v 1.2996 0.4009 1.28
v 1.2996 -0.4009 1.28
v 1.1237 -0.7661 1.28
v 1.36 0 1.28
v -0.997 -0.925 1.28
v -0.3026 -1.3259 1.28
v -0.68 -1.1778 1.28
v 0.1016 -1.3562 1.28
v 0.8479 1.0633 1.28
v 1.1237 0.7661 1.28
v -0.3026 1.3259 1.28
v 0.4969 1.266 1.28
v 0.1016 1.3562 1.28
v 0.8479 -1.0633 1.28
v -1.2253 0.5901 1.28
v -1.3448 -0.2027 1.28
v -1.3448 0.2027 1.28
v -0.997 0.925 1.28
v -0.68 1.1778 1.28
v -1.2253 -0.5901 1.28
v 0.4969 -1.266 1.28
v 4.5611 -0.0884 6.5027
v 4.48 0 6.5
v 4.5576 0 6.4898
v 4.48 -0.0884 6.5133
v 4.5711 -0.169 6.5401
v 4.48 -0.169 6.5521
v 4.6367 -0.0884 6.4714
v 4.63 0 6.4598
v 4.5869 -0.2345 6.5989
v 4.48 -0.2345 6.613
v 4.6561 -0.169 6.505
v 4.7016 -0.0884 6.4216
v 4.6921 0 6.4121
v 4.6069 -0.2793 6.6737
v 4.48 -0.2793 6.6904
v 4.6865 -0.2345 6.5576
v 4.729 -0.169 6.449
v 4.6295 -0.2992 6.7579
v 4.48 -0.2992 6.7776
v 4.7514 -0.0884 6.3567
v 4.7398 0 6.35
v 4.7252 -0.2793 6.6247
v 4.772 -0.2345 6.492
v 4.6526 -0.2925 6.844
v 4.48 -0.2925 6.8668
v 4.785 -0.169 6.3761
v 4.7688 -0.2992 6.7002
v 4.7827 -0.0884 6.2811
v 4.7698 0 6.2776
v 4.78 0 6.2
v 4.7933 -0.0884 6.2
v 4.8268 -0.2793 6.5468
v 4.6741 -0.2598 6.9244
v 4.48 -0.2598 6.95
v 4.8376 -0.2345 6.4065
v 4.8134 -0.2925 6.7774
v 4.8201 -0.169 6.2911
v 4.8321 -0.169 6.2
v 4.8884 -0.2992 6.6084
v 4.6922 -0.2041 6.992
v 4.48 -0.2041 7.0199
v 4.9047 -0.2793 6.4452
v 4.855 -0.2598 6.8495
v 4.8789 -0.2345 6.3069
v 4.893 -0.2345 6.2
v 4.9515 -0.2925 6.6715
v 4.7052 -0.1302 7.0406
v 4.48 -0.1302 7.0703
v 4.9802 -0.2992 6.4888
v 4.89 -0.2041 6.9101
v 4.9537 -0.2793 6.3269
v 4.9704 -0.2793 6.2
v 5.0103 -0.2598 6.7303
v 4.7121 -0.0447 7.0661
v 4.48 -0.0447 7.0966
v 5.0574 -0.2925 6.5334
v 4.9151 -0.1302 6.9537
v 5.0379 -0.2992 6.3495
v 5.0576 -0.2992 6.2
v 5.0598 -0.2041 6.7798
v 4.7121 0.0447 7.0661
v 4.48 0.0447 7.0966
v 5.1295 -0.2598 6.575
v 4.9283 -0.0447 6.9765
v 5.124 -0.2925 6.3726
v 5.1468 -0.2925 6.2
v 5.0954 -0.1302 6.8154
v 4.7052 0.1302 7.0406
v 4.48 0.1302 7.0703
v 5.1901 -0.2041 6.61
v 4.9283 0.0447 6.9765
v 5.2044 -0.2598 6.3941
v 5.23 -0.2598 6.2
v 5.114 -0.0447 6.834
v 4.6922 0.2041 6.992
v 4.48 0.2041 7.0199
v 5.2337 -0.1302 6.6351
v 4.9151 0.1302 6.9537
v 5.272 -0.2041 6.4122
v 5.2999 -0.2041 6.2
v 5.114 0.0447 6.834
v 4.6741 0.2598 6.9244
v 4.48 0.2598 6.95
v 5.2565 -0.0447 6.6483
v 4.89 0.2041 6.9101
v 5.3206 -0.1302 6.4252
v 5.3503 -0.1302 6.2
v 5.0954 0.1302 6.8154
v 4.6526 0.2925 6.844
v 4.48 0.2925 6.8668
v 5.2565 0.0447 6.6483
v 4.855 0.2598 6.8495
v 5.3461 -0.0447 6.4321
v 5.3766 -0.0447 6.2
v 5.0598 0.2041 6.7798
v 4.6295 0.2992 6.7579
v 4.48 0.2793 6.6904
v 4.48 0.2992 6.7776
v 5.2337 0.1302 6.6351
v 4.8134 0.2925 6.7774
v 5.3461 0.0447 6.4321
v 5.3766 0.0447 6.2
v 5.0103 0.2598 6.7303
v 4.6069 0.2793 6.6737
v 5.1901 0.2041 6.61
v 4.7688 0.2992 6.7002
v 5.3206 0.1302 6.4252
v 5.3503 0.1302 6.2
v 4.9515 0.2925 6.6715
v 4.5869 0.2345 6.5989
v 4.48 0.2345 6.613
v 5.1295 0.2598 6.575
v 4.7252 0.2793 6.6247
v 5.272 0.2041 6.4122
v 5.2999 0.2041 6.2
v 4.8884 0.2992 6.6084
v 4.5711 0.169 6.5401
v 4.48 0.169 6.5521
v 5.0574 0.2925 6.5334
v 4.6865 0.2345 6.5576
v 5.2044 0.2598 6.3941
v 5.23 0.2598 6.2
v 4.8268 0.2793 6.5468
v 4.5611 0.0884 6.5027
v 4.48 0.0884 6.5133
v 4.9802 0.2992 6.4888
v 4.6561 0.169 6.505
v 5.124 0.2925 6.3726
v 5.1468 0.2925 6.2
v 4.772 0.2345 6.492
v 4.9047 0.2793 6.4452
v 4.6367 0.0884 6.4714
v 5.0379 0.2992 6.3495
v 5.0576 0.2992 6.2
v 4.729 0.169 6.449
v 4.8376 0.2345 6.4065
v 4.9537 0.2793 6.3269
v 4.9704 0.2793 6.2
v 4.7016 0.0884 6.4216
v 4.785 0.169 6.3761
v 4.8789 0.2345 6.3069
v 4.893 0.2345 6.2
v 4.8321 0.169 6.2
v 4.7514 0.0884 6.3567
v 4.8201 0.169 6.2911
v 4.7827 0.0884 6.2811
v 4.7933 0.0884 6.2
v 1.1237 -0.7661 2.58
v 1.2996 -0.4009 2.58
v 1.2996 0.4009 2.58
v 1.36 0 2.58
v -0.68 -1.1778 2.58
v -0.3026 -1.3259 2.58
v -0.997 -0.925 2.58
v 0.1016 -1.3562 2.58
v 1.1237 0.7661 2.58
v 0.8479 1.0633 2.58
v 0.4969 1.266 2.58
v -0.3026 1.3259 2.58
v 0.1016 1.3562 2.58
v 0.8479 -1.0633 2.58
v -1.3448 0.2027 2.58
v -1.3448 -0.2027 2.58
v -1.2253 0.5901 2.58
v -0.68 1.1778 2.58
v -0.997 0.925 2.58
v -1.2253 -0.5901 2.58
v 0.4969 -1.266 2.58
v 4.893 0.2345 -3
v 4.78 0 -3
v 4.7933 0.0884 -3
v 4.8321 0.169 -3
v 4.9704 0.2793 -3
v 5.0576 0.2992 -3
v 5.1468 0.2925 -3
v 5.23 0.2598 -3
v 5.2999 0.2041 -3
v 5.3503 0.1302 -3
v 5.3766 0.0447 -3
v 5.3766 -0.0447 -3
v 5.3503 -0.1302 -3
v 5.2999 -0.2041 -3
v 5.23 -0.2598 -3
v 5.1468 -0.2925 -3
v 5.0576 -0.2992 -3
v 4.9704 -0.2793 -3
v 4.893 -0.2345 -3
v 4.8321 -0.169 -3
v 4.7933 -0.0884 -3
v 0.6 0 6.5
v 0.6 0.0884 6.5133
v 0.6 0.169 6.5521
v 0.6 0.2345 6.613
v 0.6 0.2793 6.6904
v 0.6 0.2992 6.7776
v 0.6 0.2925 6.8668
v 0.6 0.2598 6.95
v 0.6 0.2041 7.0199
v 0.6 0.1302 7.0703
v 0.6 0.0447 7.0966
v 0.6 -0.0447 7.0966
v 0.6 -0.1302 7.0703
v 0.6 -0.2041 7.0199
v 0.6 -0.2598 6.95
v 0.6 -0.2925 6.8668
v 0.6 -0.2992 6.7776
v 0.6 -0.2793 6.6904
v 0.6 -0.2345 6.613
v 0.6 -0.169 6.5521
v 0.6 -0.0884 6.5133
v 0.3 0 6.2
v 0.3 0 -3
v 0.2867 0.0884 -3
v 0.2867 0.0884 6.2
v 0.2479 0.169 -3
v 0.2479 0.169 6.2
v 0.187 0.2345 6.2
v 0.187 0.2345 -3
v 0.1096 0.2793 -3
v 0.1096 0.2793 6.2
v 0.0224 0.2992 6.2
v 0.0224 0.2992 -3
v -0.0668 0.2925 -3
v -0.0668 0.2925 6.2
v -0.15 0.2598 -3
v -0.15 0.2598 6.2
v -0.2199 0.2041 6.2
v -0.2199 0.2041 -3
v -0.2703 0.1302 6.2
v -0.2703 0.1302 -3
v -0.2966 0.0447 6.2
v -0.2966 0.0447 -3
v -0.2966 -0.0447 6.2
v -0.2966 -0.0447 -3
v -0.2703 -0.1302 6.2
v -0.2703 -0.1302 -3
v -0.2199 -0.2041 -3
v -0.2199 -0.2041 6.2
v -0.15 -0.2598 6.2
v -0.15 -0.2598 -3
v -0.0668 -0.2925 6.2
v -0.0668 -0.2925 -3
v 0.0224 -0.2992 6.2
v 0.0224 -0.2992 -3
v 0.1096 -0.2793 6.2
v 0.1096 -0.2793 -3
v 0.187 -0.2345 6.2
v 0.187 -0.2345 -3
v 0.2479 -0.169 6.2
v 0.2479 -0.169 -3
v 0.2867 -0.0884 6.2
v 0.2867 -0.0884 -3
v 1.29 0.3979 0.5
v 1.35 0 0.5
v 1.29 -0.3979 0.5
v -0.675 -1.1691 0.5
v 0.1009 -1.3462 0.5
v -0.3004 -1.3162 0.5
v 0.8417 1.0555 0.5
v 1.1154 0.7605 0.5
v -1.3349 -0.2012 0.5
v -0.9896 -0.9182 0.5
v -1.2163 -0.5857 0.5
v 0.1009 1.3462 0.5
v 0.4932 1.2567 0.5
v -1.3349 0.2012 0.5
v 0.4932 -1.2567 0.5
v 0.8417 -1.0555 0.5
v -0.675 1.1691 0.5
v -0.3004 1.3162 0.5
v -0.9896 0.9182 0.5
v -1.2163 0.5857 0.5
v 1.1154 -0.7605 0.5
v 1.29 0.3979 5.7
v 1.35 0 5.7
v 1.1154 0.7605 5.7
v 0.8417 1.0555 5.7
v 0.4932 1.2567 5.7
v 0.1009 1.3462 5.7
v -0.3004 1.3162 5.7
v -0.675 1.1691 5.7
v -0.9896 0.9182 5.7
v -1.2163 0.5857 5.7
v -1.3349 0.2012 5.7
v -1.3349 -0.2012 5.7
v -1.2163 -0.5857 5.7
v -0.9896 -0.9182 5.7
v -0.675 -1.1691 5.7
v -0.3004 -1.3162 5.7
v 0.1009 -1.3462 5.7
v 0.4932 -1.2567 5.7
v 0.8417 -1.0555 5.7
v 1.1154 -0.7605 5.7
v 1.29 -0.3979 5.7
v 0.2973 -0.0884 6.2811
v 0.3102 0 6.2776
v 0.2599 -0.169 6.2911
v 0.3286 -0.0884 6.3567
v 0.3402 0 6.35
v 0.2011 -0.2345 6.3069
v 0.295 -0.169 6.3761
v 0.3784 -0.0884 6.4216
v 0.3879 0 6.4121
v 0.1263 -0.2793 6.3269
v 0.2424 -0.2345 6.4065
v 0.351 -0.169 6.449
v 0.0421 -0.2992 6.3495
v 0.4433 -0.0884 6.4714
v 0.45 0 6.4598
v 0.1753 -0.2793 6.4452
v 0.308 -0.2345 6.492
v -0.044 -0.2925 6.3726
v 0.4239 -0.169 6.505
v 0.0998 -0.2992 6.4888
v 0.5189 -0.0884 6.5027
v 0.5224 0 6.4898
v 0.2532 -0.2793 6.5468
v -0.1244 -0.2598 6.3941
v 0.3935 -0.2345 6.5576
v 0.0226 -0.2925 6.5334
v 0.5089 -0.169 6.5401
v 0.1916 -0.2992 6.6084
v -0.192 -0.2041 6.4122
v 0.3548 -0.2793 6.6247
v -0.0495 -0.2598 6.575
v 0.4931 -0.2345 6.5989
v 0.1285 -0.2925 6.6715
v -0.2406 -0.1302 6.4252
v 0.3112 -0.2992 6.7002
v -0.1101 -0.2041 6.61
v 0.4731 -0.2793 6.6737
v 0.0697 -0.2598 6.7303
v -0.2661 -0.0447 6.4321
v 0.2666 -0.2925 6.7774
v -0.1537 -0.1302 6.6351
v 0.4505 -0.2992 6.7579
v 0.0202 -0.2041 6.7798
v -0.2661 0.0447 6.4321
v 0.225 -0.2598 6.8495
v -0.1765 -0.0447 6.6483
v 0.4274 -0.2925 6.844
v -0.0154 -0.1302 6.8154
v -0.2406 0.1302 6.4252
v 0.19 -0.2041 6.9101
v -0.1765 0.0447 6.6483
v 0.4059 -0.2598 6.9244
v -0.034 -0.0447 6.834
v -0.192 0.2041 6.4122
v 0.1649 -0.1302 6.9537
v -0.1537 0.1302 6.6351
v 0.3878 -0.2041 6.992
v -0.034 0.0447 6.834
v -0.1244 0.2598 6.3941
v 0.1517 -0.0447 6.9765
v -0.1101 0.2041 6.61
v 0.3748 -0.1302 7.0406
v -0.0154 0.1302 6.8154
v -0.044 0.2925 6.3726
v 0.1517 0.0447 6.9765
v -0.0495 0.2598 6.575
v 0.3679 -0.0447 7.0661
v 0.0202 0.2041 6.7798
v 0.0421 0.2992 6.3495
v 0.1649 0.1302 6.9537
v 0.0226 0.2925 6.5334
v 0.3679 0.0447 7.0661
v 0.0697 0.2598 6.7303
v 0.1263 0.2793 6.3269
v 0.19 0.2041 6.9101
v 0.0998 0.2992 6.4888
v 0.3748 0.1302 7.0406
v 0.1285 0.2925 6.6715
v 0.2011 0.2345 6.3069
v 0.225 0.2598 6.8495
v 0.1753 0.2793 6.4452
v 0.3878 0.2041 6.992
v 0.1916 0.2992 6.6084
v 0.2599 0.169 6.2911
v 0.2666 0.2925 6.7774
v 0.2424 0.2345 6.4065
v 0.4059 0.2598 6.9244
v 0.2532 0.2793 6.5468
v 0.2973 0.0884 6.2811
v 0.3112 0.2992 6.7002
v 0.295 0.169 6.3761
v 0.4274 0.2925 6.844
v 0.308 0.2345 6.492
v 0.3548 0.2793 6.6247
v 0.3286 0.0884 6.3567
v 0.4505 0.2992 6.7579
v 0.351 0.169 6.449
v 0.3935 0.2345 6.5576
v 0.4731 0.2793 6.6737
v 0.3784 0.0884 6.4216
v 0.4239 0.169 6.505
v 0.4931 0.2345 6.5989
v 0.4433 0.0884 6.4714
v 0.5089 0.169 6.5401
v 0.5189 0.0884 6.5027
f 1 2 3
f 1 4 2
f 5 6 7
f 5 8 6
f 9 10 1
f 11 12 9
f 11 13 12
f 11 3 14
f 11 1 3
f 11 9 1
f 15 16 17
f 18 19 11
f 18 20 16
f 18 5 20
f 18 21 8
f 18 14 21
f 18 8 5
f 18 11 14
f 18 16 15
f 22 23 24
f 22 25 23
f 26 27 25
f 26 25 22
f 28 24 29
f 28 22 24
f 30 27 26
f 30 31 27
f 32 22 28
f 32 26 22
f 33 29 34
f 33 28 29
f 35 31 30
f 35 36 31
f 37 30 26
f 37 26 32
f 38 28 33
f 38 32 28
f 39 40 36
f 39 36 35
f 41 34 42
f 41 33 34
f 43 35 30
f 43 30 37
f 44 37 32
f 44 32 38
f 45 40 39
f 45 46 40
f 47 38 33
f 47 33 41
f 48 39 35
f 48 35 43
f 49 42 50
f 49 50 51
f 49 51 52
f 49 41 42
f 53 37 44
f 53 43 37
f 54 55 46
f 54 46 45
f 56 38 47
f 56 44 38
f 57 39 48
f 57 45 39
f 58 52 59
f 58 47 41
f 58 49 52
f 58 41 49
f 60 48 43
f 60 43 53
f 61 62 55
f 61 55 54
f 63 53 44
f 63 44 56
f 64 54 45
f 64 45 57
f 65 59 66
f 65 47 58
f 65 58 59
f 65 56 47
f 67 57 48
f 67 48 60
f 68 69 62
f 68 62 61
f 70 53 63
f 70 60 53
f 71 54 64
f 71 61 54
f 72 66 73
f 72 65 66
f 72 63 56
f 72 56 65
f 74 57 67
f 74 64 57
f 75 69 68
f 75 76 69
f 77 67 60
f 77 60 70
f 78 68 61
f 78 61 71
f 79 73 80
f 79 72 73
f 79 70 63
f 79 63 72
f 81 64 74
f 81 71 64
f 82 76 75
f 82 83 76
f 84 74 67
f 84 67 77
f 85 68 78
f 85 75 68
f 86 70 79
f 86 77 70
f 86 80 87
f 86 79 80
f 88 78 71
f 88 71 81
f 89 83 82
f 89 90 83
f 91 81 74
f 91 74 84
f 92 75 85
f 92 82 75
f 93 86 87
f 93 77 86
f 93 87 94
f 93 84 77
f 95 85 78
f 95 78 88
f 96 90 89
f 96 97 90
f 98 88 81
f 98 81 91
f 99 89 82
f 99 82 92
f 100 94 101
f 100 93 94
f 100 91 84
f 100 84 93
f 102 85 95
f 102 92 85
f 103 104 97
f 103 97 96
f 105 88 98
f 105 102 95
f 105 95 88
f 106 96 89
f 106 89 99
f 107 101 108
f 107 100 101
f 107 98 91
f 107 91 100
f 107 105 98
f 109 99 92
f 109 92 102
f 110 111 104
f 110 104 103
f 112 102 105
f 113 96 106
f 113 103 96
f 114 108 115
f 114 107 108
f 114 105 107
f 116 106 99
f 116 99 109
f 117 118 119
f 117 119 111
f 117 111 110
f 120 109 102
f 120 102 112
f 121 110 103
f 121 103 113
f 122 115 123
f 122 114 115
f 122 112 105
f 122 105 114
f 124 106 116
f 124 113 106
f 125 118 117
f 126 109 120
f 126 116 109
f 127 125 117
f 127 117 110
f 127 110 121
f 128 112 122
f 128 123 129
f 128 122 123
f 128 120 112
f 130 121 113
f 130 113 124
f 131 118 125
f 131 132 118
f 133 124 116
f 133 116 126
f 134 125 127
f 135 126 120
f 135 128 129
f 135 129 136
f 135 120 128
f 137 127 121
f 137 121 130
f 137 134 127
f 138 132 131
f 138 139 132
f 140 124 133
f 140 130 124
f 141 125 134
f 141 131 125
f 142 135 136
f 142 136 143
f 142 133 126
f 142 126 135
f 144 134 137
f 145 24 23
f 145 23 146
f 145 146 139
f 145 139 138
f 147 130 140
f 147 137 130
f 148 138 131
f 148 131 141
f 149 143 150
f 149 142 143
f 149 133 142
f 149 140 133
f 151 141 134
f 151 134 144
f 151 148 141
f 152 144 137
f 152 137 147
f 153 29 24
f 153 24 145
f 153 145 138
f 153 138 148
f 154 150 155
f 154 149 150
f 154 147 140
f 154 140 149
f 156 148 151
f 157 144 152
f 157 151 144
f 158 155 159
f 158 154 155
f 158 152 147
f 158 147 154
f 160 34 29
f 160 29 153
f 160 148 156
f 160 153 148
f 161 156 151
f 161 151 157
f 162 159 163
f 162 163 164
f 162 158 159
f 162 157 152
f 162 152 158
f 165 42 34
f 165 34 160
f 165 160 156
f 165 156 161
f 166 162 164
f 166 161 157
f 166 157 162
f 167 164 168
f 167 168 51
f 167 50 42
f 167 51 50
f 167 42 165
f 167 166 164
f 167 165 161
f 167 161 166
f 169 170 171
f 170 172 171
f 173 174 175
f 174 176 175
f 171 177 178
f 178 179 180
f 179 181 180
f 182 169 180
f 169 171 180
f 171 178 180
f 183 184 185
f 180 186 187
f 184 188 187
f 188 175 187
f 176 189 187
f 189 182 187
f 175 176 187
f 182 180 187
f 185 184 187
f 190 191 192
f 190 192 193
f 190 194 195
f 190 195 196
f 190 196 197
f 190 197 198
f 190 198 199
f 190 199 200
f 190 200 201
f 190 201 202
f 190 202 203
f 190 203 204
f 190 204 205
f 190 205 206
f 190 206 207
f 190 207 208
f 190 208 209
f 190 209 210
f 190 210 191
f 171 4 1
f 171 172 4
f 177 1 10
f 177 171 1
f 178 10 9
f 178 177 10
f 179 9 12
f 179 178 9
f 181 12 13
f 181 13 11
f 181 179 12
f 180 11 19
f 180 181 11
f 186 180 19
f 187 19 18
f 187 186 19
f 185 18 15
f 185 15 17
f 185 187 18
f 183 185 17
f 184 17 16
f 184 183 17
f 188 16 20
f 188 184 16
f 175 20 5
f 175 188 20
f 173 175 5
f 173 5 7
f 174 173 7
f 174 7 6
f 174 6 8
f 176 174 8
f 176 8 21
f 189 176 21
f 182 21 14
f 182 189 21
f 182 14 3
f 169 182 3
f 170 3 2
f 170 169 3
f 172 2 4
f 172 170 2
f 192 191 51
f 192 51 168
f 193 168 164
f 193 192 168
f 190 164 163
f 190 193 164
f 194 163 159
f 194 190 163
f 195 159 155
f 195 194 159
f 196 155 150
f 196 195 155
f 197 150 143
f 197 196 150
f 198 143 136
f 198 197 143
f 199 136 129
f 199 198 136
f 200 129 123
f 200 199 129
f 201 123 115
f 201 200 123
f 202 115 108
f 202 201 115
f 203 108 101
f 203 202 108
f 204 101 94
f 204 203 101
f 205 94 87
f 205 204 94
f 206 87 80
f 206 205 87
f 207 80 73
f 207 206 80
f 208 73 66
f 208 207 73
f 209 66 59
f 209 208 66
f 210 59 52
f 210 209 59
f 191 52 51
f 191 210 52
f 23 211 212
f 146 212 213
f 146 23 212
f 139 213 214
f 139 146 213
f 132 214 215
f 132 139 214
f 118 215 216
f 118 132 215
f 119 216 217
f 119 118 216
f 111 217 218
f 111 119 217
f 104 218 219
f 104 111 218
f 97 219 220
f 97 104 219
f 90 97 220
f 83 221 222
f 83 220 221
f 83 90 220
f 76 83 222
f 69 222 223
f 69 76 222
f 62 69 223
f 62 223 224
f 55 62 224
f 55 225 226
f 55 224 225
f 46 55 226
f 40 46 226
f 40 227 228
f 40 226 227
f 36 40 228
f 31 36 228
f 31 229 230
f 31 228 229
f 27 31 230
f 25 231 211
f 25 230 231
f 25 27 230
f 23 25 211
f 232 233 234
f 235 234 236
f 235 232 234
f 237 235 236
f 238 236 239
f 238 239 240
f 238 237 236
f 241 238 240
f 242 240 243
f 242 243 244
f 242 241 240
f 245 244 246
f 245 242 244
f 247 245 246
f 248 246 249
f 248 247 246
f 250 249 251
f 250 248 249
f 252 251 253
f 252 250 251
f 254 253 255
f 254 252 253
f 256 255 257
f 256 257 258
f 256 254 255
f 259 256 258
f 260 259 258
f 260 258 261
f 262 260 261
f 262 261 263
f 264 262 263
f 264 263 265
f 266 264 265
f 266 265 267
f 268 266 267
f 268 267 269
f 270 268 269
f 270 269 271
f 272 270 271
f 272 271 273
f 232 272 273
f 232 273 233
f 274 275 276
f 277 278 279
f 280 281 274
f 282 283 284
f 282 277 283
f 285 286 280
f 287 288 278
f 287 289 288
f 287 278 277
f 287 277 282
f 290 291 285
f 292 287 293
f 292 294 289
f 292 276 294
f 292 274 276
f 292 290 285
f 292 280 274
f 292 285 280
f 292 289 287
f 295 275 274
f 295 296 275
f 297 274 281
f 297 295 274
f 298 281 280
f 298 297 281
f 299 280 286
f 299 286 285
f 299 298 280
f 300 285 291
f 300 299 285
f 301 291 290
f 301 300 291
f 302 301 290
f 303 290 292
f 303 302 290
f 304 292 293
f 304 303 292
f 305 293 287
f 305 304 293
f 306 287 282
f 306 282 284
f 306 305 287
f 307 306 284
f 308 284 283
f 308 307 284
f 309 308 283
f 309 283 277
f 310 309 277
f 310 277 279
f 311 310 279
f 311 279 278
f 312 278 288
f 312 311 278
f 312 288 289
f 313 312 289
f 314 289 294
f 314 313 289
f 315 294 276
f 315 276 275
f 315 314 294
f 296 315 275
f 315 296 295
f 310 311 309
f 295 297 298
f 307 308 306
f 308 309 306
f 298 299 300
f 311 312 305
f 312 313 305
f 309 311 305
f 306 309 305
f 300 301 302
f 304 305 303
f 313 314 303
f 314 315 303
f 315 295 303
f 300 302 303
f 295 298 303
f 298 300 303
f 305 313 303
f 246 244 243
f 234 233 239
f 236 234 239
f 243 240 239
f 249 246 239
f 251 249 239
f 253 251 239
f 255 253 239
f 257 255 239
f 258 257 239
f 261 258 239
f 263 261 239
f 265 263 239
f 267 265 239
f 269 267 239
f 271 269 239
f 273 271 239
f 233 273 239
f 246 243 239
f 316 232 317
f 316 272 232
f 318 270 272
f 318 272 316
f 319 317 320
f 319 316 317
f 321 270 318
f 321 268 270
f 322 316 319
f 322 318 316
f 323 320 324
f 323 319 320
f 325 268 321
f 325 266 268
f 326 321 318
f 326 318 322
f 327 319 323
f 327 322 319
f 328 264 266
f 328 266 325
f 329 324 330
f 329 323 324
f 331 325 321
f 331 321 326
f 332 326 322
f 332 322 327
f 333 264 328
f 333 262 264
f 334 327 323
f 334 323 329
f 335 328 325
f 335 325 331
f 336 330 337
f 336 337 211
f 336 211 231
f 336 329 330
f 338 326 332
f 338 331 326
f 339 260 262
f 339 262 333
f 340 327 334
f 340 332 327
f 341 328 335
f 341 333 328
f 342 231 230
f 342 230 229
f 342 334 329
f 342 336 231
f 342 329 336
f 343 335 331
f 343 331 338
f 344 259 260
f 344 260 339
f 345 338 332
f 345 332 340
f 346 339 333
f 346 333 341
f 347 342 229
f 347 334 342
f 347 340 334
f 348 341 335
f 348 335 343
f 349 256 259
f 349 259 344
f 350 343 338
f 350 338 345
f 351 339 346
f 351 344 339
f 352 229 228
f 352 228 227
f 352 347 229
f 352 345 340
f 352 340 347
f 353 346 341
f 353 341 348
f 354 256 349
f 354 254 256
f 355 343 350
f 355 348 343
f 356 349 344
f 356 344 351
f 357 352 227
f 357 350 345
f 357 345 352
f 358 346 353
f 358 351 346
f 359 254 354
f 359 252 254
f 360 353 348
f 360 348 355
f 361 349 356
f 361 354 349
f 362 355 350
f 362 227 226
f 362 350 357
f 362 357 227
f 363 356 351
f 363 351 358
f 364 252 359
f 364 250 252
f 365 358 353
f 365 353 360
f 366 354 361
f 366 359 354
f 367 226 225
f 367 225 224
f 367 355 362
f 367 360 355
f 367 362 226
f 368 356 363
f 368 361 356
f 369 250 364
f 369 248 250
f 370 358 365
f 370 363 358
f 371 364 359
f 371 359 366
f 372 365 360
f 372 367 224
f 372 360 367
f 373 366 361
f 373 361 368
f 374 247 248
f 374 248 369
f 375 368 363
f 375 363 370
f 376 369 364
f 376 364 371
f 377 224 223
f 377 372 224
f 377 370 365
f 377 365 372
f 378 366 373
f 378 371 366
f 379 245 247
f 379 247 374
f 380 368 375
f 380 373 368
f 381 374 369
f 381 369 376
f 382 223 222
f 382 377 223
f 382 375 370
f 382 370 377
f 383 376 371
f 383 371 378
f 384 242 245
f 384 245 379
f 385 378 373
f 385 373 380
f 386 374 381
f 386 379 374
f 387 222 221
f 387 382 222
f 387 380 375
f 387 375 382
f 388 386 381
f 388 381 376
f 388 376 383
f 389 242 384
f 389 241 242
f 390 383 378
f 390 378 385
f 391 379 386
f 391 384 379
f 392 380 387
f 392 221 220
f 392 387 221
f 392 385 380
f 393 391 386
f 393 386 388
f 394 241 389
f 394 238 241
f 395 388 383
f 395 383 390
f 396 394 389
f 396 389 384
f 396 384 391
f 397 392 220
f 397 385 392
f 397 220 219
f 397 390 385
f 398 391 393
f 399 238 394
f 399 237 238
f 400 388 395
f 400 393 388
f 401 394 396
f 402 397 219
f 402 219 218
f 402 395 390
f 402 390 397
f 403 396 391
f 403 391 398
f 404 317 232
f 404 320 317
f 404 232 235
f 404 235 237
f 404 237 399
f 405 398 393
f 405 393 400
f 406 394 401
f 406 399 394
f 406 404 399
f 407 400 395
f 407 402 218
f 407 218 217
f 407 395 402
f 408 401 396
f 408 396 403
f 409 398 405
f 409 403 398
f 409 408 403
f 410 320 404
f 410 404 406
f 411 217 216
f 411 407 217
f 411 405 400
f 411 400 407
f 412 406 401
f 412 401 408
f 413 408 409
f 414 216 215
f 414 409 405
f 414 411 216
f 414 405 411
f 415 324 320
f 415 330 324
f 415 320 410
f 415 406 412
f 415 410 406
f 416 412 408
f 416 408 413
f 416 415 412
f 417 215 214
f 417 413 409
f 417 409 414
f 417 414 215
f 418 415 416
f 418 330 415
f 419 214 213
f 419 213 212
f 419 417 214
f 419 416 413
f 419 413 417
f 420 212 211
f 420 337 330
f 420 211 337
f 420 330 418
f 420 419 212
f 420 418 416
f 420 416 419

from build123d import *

# Parameters (mm, degrees)
SKETCH001_R = 0.3
SKETCH002_W = 1.35
SKETCH002_H = 5.2
SKETCH003_W = 1.36
SKETCH003_H = 1.3


with BuildPart() as sweep_body:
    # Sweep: sweep along a path in Sketch
    with BuildLine(Plane.XZ) as sweep_path:
        Line((0, -3), (0, 6.2))
        ThreePointArc((0, 6.2), (0.175736, 6.624264), (0.6, 6.8))
        Line((0.6, 6.8), (4.48, 6.8))
        ThreePointArc((4.48, 6.8), (4.904264, 6.624264), (5.08, 6.2))
        Line((5.08, 6.2), (5.08, -3))
    # Sketch001 → Sweep (sweep)
    with BuildSketch(Plane.XY):
        Circle(SKETCH001_R)
    sweep(path=sweep_path.line)


with BuildPart() as revolution:
    # Sketch002 → Revolution (revolve)
    with BuildSketch(Plane.XZ):
        with Locations((0.675, 3.1)):
            Rectangle(SKETCH002_W, SKETCH002_H)
    revolve(axis=Axis((0, 0, 0.5), (0, 0, 1)))


with BuildPart() as revolution001:
    # Sketch003 → Revolution001 (revolve)
    with BuildSketch(Plane.XZ):
        with Locations((0.68, 1.93)):
            Rectangle(SKETCH003_W, SKETCH003_H)
    revolve(axis=Axis((0, 0, 0), (0, 0, 1)))


solid = Compound([sweep_body.part, revolution.part, revolution001.part])
